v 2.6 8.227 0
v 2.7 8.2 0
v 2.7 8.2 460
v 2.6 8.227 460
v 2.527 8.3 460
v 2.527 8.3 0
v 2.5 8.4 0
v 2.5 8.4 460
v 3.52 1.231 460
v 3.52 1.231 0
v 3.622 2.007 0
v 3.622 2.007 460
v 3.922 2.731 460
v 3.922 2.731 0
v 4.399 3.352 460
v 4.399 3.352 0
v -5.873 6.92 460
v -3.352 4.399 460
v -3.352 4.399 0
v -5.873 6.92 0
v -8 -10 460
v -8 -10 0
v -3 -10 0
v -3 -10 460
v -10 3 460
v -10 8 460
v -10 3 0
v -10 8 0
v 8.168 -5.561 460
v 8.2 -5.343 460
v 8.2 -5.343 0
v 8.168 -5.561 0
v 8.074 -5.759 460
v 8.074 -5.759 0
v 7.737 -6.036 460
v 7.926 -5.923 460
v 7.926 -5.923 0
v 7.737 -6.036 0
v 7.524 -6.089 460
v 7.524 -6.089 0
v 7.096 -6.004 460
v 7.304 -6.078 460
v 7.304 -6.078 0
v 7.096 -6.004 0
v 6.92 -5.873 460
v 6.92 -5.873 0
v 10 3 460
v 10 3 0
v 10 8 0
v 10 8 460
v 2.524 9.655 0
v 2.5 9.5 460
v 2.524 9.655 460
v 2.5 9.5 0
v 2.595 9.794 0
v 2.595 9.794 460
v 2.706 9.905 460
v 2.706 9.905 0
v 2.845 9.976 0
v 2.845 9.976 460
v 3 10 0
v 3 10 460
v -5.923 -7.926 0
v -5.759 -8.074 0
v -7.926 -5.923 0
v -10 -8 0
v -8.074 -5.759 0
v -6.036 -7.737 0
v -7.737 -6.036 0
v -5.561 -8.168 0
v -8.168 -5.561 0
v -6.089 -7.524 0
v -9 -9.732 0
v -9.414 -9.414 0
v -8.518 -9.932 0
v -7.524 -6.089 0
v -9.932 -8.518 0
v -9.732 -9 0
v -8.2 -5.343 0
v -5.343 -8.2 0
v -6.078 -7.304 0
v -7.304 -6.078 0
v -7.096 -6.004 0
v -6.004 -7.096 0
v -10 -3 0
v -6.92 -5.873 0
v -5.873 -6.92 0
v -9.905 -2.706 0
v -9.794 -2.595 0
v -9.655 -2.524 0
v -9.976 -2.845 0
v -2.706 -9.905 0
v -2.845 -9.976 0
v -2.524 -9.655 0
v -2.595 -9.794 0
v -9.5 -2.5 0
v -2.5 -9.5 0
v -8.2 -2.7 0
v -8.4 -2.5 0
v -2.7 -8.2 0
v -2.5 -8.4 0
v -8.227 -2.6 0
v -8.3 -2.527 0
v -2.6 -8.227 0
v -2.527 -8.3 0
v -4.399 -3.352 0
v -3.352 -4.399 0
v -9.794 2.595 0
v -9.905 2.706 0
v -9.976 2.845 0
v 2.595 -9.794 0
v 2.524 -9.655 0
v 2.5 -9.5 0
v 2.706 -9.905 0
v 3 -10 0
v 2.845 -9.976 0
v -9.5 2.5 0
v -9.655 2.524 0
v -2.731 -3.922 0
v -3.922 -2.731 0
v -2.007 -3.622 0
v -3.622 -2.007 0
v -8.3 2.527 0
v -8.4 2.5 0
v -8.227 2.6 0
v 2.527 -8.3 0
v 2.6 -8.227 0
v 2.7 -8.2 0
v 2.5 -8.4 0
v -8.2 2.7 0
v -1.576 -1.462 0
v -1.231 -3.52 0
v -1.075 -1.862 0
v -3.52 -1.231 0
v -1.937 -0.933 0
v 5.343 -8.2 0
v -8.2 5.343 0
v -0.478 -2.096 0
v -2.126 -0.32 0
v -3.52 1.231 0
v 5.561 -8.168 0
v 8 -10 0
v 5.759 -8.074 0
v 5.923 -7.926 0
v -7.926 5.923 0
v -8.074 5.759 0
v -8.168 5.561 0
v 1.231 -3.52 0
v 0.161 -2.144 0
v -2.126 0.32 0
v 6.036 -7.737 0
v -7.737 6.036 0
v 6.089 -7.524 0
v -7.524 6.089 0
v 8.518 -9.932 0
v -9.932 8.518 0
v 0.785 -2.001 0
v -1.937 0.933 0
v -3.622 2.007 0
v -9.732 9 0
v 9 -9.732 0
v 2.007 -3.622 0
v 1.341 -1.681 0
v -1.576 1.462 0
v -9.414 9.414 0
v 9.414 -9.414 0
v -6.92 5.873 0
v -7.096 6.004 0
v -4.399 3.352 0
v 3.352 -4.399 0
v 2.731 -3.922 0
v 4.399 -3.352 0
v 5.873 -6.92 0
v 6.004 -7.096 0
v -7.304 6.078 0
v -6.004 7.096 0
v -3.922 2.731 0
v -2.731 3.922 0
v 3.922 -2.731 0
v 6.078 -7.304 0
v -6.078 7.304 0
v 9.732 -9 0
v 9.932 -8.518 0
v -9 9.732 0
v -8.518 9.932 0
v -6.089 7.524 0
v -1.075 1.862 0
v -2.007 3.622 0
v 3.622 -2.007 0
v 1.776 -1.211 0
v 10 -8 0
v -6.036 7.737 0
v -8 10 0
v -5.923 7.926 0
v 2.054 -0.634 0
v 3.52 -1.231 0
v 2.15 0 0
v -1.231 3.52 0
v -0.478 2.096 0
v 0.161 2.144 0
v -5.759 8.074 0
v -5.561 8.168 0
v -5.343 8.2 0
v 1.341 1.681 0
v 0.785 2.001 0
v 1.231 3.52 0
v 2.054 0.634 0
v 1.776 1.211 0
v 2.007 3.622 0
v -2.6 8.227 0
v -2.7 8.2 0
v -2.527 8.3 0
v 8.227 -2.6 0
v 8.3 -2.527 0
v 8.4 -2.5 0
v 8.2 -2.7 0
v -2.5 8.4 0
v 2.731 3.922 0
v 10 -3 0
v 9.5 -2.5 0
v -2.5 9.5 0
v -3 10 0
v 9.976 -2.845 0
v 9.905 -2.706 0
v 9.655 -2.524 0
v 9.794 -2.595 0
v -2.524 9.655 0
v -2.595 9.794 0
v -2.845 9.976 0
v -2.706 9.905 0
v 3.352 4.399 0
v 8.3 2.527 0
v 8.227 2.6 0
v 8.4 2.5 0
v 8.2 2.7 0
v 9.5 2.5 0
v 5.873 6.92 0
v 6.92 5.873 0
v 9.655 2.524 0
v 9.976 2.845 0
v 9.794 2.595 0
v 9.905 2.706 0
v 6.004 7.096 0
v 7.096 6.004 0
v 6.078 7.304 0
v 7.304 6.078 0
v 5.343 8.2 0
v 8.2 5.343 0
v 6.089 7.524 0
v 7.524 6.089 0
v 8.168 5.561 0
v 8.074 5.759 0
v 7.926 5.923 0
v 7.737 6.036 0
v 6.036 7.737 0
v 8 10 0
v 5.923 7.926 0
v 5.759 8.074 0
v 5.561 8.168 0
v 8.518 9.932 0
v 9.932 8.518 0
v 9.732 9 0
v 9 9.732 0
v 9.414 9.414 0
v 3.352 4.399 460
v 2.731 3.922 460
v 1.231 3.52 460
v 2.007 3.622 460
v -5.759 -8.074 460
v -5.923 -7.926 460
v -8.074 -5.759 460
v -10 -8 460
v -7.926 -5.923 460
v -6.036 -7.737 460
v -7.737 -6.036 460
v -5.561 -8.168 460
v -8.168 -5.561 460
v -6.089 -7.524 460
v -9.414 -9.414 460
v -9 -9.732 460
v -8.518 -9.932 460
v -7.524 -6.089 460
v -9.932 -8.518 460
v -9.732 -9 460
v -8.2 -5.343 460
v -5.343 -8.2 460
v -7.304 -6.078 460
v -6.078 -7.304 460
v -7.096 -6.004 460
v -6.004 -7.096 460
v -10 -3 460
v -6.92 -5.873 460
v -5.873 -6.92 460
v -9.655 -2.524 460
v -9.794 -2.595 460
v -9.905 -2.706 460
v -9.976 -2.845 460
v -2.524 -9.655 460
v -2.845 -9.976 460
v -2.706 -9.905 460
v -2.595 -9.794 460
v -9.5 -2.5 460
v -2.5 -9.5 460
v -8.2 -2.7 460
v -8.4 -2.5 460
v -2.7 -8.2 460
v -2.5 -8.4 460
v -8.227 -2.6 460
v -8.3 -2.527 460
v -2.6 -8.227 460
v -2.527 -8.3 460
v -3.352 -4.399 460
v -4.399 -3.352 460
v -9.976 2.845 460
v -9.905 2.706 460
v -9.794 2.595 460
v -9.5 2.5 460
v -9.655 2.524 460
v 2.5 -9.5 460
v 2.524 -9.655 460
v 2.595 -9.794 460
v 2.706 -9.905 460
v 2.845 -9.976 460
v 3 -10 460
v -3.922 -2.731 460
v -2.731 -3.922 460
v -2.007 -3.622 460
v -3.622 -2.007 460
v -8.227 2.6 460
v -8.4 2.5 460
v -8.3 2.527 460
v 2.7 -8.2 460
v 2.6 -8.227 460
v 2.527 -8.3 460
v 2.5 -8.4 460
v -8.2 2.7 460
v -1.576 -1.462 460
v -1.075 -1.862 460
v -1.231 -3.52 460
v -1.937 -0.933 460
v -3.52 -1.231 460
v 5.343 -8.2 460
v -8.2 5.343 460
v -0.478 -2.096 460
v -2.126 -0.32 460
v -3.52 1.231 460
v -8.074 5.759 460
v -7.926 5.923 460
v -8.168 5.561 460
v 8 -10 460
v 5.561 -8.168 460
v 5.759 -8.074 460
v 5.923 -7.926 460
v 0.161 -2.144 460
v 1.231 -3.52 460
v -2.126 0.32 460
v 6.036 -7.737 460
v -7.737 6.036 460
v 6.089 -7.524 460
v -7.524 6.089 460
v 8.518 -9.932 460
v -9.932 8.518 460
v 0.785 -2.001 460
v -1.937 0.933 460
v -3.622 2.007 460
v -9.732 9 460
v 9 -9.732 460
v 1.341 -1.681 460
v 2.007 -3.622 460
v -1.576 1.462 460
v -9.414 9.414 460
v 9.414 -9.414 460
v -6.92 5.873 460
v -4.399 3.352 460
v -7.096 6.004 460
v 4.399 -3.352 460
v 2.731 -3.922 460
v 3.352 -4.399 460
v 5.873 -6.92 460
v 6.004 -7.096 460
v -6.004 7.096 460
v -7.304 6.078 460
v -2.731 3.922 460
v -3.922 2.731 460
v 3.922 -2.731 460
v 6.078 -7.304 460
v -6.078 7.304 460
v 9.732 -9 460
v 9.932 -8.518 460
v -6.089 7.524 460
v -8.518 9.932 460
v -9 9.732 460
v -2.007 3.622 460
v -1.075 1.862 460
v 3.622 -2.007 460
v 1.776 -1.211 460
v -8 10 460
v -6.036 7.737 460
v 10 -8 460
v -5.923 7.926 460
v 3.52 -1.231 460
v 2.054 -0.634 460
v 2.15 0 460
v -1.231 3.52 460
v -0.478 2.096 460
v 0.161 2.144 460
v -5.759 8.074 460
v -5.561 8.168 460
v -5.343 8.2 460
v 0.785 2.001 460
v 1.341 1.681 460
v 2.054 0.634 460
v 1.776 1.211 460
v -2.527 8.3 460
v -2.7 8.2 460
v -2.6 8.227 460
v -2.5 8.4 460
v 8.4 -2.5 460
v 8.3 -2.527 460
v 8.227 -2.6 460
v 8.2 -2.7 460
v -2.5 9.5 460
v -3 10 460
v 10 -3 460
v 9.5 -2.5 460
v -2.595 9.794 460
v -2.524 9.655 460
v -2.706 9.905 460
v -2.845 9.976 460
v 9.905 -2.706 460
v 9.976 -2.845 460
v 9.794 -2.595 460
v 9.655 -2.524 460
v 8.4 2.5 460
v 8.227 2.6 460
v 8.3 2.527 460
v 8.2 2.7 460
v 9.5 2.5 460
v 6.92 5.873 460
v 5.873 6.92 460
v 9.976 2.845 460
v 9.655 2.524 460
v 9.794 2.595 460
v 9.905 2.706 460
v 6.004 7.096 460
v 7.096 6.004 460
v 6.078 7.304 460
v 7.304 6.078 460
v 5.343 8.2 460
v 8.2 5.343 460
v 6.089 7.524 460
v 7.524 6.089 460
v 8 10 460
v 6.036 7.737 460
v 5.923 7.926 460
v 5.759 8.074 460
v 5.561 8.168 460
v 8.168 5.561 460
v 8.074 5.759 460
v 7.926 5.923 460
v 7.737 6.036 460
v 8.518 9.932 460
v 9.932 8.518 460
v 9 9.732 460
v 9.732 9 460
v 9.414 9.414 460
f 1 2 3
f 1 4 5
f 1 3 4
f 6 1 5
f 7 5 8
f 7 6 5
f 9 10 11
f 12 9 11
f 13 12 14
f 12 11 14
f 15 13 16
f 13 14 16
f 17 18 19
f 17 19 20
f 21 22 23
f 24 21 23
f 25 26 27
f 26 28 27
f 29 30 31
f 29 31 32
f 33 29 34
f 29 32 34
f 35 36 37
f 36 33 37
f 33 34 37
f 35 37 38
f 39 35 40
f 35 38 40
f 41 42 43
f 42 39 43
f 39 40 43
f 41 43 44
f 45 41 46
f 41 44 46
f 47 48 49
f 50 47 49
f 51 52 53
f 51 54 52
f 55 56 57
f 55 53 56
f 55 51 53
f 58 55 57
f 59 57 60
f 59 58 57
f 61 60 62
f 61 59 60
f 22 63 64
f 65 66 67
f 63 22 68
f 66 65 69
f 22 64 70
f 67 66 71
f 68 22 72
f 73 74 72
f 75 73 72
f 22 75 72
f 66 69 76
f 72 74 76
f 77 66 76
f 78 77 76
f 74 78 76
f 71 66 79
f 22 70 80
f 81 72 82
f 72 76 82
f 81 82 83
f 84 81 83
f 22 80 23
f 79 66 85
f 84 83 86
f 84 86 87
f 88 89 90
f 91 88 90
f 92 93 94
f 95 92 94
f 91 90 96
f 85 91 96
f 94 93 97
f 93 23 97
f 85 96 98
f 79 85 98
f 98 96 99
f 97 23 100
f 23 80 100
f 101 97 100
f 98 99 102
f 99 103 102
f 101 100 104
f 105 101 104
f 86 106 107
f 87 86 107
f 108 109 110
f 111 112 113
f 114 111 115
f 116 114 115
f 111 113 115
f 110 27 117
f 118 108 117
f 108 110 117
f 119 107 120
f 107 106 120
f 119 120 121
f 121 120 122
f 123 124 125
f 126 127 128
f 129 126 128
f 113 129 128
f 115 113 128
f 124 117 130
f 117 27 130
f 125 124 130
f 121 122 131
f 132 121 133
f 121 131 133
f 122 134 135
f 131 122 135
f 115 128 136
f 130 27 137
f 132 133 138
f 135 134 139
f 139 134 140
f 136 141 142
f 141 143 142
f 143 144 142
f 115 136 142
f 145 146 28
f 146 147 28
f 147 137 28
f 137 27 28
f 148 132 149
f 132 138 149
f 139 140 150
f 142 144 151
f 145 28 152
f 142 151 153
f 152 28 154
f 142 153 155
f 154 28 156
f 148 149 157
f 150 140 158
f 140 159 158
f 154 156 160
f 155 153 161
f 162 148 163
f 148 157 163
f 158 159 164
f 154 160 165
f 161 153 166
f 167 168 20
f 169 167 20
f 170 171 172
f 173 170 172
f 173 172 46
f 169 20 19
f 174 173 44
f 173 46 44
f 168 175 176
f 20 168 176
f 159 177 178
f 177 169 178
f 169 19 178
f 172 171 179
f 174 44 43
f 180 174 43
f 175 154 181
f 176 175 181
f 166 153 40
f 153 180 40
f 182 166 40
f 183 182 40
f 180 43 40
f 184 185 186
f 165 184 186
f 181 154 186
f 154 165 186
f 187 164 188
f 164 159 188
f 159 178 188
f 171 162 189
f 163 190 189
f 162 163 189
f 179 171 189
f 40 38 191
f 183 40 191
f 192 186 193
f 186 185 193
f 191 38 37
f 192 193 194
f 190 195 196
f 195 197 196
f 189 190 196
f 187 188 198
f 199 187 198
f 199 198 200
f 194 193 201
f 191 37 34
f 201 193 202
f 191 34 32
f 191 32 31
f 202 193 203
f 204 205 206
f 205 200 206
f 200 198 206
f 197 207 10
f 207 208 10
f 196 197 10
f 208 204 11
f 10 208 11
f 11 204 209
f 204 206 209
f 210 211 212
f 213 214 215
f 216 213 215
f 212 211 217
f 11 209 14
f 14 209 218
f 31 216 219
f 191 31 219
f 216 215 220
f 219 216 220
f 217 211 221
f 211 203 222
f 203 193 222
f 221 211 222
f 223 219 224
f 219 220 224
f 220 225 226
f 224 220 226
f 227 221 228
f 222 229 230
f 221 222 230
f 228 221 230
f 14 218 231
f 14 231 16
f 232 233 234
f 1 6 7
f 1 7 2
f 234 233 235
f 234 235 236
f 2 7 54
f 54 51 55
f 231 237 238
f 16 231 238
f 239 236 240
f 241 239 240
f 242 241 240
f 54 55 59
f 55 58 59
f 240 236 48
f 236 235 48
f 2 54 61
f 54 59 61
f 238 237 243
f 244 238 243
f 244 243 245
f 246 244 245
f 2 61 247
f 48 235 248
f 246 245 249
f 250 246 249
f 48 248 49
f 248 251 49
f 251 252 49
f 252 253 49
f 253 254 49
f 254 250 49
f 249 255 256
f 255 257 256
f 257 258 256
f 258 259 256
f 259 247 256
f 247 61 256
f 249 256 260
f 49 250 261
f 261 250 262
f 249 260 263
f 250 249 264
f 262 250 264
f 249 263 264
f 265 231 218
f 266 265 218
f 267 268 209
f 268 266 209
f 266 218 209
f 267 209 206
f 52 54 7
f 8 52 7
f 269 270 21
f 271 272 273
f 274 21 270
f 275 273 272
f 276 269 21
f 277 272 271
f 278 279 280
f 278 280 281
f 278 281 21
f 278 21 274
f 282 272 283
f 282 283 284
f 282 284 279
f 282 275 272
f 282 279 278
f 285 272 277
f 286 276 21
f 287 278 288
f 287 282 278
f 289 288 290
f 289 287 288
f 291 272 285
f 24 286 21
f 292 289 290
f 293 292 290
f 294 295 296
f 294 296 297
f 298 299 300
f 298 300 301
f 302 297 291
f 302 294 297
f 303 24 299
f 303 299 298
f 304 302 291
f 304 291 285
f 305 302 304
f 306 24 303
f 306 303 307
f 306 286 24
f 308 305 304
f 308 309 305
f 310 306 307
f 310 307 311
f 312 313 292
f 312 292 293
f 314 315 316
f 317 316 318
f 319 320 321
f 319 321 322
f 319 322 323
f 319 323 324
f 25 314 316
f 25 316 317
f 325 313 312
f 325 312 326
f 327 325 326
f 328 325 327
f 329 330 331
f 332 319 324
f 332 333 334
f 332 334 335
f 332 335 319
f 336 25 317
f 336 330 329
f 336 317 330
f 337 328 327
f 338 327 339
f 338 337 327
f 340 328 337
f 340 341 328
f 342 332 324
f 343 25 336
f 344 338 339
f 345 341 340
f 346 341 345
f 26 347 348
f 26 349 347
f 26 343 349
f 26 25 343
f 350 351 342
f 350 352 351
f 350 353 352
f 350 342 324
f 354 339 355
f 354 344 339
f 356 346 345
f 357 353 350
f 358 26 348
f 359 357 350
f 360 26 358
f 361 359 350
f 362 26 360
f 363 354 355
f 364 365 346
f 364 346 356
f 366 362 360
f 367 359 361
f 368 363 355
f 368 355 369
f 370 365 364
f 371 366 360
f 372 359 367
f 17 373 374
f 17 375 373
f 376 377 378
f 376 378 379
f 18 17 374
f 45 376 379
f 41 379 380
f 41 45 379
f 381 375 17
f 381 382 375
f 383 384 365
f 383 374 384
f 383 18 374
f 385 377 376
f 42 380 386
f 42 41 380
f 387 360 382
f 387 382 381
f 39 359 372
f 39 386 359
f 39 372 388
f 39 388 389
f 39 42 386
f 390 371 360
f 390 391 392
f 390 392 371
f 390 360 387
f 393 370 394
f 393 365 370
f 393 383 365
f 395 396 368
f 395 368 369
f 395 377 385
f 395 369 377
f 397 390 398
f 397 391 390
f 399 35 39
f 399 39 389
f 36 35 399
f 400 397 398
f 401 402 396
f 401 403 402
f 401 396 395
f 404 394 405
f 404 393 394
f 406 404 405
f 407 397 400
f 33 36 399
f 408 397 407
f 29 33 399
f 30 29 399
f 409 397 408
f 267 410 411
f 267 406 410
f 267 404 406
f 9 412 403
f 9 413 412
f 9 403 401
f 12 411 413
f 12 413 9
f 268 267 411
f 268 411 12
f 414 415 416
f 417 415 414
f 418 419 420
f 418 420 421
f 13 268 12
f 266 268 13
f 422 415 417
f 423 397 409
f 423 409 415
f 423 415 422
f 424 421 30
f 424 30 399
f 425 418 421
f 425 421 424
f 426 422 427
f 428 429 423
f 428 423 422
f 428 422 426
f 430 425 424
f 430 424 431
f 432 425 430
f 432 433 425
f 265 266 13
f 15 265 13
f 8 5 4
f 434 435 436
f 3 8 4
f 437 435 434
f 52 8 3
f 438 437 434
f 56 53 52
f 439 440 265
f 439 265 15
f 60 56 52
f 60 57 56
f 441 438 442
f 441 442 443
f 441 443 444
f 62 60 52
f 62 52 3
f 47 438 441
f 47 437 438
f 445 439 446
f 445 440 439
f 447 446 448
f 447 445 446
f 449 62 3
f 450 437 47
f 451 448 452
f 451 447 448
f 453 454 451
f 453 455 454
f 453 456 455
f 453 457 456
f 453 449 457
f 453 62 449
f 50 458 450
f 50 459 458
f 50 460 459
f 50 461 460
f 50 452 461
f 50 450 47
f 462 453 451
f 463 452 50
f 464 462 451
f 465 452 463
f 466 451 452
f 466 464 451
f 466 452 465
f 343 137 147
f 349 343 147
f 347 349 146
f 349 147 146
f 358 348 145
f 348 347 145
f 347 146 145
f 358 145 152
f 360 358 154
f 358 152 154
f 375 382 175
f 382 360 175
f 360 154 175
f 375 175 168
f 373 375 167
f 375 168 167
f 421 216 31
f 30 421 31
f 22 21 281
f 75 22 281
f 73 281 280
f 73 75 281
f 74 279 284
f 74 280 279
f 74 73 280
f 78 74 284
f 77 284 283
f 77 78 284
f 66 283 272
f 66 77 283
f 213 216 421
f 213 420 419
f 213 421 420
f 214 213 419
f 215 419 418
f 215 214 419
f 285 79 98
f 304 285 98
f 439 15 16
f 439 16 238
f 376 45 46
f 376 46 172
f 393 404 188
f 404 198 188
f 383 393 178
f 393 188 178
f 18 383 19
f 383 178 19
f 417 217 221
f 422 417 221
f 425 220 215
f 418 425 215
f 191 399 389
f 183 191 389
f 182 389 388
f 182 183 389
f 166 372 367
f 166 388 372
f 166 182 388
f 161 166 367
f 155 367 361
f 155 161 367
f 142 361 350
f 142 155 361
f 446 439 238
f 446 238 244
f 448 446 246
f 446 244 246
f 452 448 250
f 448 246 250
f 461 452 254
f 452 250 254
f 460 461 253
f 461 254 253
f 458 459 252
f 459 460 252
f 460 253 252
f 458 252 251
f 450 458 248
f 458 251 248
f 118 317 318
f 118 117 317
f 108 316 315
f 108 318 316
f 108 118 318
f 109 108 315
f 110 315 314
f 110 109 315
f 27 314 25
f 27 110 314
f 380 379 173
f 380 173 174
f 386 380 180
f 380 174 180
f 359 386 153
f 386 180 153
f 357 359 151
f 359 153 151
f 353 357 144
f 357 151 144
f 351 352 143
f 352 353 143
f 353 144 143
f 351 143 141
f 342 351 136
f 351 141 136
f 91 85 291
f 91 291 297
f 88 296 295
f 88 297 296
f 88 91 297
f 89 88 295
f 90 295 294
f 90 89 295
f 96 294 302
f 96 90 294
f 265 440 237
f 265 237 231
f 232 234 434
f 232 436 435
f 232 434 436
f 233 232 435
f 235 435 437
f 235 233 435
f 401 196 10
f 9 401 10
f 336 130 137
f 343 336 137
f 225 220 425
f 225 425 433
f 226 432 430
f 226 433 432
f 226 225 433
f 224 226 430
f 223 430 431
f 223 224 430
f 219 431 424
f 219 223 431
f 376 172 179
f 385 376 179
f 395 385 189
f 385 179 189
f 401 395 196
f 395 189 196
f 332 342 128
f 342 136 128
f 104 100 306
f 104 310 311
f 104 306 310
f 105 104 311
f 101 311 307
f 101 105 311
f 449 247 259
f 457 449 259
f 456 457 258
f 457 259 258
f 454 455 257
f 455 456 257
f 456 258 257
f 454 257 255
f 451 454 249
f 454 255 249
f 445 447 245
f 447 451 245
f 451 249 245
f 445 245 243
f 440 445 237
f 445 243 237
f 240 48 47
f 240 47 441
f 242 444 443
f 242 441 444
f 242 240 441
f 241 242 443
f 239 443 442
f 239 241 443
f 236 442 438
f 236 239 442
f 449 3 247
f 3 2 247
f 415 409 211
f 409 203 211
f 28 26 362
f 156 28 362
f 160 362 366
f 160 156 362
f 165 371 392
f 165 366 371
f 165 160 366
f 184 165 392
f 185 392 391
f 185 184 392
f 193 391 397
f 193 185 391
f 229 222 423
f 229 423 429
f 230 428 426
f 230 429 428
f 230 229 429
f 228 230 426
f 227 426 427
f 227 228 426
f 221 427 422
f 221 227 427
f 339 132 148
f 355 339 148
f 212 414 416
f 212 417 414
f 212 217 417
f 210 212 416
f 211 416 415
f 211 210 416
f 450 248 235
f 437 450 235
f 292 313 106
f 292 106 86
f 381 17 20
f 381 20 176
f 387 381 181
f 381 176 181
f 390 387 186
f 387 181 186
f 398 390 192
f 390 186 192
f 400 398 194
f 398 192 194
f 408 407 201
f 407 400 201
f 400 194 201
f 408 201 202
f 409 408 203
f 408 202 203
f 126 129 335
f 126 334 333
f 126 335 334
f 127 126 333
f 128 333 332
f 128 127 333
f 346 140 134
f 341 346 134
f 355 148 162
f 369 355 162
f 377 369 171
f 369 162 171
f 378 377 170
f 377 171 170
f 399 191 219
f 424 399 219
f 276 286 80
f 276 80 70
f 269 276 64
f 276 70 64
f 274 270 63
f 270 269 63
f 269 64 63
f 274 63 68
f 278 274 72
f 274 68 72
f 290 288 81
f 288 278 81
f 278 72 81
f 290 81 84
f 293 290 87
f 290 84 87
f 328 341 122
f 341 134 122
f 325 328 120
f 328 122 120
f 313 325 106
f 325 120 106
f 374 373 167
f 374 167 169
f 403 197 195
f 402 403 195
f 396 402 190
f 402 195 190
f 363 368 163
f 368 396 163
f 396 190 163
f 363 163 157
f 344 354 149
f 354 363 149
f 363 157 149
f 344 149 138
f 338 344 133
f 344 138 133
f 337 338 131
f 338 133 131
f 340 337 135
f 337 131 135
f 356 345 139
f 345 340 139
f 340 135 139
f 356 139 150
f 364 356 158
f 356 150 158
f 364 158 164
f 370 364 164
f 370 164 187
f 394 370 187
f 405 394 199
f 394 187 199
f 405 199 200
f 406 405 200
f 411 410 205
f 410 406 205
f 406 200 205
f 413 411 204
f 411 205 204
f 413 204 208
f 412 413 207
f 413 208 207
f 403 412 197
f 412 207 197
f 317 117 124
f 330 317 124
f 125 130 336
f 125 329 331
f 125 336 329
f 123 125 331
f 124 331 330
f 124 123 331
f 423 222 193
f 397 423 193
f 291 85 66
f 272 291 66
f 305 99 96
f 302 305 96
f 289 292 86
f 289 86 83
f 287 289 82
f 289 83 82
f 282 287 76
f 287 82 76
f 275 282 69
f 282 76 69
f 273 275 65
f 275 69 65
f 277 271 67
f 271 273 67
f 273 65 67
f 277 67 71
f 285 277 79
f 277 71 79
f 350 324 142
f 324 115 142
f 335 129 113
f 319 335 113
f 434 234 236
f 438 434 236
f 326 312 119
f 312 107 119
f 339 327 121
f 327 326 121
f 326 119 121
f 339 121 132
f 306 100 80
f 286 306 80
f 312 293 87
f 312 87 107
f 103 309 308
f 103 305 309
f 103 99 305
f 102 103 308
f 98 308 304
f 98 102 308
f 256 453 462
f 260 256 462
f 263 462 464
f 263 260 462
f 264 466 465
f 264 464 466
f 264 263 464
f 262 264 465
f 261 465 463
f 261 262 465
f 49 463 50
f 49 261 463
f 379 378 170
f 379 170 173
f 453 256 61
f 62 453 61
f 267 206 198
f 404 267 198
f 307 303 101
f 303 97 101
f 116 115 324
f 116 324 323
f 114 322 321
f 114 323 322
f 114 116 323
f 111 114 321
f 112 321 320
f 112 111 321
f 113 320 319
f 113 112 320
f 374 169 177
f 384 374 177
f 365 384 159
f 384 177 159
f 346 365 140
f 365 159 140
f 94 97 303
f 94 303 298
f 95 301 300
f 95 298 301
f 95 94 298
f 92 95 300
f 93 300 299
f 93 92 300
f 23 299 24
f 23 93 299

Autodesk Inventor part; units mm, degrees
ref_plane "YZ Plane" through (0, 0, 0) normal (1, 0, 0) x (0, 1, 0)
ref_plane "Płaszczyzna początkowa" through (0, 0, 0) normal (0, 0, 1) x (1, 0, 0)
ref_plane "Płaszczyzna końcowa" through (0, 0, 460) normal (0, 0, 1) x (1, 0, 0)
sketch "Szkic" plane through (0, 0, 0) normal (0, 0, 1) x (1, 0, 0)
  arc A0 (8, -10) -> (10, -8) centre (8, -8) ccw
  line L0 (10, -8) -> (10, -3)
  arc A1 (10, -3) -> (9.5, -2.5) centre (9.5, -3) ccw
  line L1 (9.5, -2.5) -> (8.4, -2.5)
  arc A2 (8.4, -2.5) -> (8.2, -2.7) centre (8.4, -2.7) ccw
  line L2 (8.2, -2.7) -> (8.2, -5.3428)
  arc A3 (6.9197, -5.8732) -> (8.2, -5.3428) centre (7.45, -5.3428) ccw
  line L3 (6.9197, -5.8732) -> (4.3987, -3.3522)
  arc A4 (3.52, -1.2308) -> (4.3987, -3.3522) centre (6.52, -1.2308) ccw
  line L4 (3.52, -1.2308) -> (3.52, 1.2308)
  arc A5 (4.3987, 3.3522) -> (3.52, 1.2308) centre (6.52, 1.2308) ccw
  line L5 (4.3987, 3.3522) -> (6.9197, 5.8732)
  arc A6 (8.2, 5.3428) -> (6.9197, 5.8732) centre (7.45, 5.3428) ccw
  line L6 (8.2, 5.3428) -> (8.2, 2.7)
  arc A7 (8.2, 2.7) -> (8.4, 2.5) centre (8.4, 2.7) ccw
  line L7 (8.4, 2.5) -> (9.5, 2.5)
  arc A8 (9.5, 2.5) -> (10, 3) centre (9.5, 3) ccw
  line L8 (10, 3) -> (10, 8)
  arc A9 (10, 8) -> (8, 10) centre (8, 8) ccw
  line L9 (8, 10) -> (3, 10)
  arc A10 (3, 10) -> (2.5, 9.5) centre (3, 9.5) ccw
  line L10 (2.5, 9.5) -> (2.5, 8.4)
  arc A11 (2.5, 8.4) -> (2.7, 8.2) centre (2.7, 8.4) ccw
  line L11 (2.7, 8.2) -> (5.3428, 8.2)
  arc A12 (5.8732, 6.9197) -> (5.3428, 8.2) centre (5.3428, 7.45) ccw
  line L12 (5.8732, 6.9197) -> (3.3522, 4.3987)
  arc A13 (1.2308, 3.52) -> (3.3522, 4.3987) centre (1.2308, 6.52) ccw
  line L13 (1.2308, 3.52) -> (-1.2308, 3.52)
  arc A14 (-3.3522, 4.3987) -> (-1.2308, 3.52) centre (-1.2308, 6.52) ccw
  line L14 (-3.3522, 4.3987) -> (-5.8732, 6.9197)
  arc A15 (-5.3428, 8.2) -> (-5.8732, 6.9197) centre (-5.3428, 7.45) ccw
  line L15 (-5.3428, 8.2) -> (-2.7, 8.2)
  arc A16 (-2.7, 8.2) -> (-2.5, 8.4) centre (-2.7, 8.4) ccw
  line L16 (-2.5, 8.4) -> (-2.5, 9.5)
  arc A17 (-2.5, 9.5) -> (-3, 10) centre (-3, 9.5) ccw
  line L17 (-3, 10) -> (-8, 10)
  arc A18 (-8, 10) -> (-10, 8) centre (-8, 8) ccw
  line L18 (-10, 8) -> (-10, 3)
  arc A19 (-10, 3) -> (-9.5, 2.5) centre (-9.5, 3) ccw
  line L19 (-9.5, 2.5) -> (-8.4, 2.5)
  arc A20 (-8.4, 2.5) -> (-8.2, 2.7) centre (-8.4, 2.7) ccw
  line L20 (-8.2, 2.7) -> (-8.2, 5.3428)
  arc A21 (-6.9197, 5.8732) -> (-8.2, 5.3428) centre (-7.45, 5.3428) ccw
  line L21 (-6.9197, 5.8732) -> (-4.3987, 3.3522)
  arc A22 (-3.52, 1.2308) -> (-4.3987, 3.3522) centre (-6.52, 1.2308) ccw
  line L22 (-3.52, 1.2308) -> (-3.52, -1.2308)
  arc A23 (-4.3987, -3.3522) -> (-3.52, -1.2308) centre (-6.52, -1.2308) ccw
  line L23 (-4.3987, -3.3522) -> (-6.9197, -5.8732)
  arc A24 (-8.2, -5.3428) -> (-6.9197, -5.8732) centre (-7.45, -5.3428) ccw
  line L24 (-8.2, -5.3428) -> (-8.2, -2.7)
  arc A25 (-8.2, -2.7) -> (-8.4, -2.5) centre (-8.4, -2.7) ccw
  line L25 (-8.4, -2.5) -> (-9.5, -2.5)
  arc A26 (-9.5, -2.5) -> (-10, -3) centre (-9.5, -3) ccw
  line L26 (-10, -3) -> (-10, -8)
  arc A27 (-10, -8) -> (-8, -10) centre (-8, -8) ccw
  line L27 (-8, -10) -> (-3, -10)
  arc A28 (-3, -10) -> (-2.5, -9.5) centre (-3, -9.5) ccw
  line L28 (-2.5, -9.5) -> (-2.5, -8.4)
  arc A29 (-2.5, -8.4) -> (-2.7, -8.2) centre (-2.7, -8.4) ccw
  line L29 (-2.7, -8.2) -> (-5.3428, -8.2)
  arc A30 (-5.8732, -6.9197) -> (-5.3428, -8.2) centre (-5.3428, -7.45) ccw
  line L30 (-5.8732, -6.9197) -> (-3.3522, -4.3987)
  arc A31 (-1.2308, -3.52) -> (-3.3522, -4.3987) centre (-1.2308, -6.52) ccw
  line L31 (-1.2308, -3.52) -> (1.2308, -3.52)
  arc A32 (3.3522, -4.3987) -> (1.2308, -3.52) centre (1.2308, -6.52) ccw
  line L32 (3.3522, -4.3987) -> (5.8732, -6.9197)
  arc A33 (5.3428, -8.2) -> (5.8732, -6.9197) centre (5.3428, -7.45) ccw
  line L33 (5.3428, -8.2) -> (2.7, -8.2)
  arc A34 (2.7, -8.2) -> (2.5, -8.4) centre (2.7, -8.4) ccw
  line L34 (2.5, -8.4) -> (2.5, -9.5)
  arc A35 (2.5, -9.5) -> (3, -10) centre (3, -9.5) ccw
  line L35 (3, -10) -> (8, -10)
  circle A36 centre (0, 0) radius 2.15
  point P0 (10, -10)
extrude "Bryła" add sketch "Szkic" along normal up to surface (460 mm away) from surface at 0
sketch "Szkic4" plane through (0, 0, 0) normal (0, 0, 1) x (1, 0, 0)
  line L0 (0, 0) -> (10, 0)
ref_plane "Płaszczyzna konstrukcyjna4" through (0, 0, 0) normal (0, -1, 0) x (1, 0, 0)
sketch "Szkic5" plane through (0, 0, 0) normal (0, -1, 0) x (1, 0, 0)
  line L0 (-2, 0) -> (12, 0)
  line L1 (-2, 460) -> (12, 460)
  dimension "d7" = 460
equation "\"G_OFFSET_START\" = 0"
equation "\"G_OFFSET_END\" = 0"
equation "\"G_L\" = d7"
properties part number "COTS_ARMA_AR3701_20x20_Alu_Extr_00000003" material "Aluminium 6061-AHC"
